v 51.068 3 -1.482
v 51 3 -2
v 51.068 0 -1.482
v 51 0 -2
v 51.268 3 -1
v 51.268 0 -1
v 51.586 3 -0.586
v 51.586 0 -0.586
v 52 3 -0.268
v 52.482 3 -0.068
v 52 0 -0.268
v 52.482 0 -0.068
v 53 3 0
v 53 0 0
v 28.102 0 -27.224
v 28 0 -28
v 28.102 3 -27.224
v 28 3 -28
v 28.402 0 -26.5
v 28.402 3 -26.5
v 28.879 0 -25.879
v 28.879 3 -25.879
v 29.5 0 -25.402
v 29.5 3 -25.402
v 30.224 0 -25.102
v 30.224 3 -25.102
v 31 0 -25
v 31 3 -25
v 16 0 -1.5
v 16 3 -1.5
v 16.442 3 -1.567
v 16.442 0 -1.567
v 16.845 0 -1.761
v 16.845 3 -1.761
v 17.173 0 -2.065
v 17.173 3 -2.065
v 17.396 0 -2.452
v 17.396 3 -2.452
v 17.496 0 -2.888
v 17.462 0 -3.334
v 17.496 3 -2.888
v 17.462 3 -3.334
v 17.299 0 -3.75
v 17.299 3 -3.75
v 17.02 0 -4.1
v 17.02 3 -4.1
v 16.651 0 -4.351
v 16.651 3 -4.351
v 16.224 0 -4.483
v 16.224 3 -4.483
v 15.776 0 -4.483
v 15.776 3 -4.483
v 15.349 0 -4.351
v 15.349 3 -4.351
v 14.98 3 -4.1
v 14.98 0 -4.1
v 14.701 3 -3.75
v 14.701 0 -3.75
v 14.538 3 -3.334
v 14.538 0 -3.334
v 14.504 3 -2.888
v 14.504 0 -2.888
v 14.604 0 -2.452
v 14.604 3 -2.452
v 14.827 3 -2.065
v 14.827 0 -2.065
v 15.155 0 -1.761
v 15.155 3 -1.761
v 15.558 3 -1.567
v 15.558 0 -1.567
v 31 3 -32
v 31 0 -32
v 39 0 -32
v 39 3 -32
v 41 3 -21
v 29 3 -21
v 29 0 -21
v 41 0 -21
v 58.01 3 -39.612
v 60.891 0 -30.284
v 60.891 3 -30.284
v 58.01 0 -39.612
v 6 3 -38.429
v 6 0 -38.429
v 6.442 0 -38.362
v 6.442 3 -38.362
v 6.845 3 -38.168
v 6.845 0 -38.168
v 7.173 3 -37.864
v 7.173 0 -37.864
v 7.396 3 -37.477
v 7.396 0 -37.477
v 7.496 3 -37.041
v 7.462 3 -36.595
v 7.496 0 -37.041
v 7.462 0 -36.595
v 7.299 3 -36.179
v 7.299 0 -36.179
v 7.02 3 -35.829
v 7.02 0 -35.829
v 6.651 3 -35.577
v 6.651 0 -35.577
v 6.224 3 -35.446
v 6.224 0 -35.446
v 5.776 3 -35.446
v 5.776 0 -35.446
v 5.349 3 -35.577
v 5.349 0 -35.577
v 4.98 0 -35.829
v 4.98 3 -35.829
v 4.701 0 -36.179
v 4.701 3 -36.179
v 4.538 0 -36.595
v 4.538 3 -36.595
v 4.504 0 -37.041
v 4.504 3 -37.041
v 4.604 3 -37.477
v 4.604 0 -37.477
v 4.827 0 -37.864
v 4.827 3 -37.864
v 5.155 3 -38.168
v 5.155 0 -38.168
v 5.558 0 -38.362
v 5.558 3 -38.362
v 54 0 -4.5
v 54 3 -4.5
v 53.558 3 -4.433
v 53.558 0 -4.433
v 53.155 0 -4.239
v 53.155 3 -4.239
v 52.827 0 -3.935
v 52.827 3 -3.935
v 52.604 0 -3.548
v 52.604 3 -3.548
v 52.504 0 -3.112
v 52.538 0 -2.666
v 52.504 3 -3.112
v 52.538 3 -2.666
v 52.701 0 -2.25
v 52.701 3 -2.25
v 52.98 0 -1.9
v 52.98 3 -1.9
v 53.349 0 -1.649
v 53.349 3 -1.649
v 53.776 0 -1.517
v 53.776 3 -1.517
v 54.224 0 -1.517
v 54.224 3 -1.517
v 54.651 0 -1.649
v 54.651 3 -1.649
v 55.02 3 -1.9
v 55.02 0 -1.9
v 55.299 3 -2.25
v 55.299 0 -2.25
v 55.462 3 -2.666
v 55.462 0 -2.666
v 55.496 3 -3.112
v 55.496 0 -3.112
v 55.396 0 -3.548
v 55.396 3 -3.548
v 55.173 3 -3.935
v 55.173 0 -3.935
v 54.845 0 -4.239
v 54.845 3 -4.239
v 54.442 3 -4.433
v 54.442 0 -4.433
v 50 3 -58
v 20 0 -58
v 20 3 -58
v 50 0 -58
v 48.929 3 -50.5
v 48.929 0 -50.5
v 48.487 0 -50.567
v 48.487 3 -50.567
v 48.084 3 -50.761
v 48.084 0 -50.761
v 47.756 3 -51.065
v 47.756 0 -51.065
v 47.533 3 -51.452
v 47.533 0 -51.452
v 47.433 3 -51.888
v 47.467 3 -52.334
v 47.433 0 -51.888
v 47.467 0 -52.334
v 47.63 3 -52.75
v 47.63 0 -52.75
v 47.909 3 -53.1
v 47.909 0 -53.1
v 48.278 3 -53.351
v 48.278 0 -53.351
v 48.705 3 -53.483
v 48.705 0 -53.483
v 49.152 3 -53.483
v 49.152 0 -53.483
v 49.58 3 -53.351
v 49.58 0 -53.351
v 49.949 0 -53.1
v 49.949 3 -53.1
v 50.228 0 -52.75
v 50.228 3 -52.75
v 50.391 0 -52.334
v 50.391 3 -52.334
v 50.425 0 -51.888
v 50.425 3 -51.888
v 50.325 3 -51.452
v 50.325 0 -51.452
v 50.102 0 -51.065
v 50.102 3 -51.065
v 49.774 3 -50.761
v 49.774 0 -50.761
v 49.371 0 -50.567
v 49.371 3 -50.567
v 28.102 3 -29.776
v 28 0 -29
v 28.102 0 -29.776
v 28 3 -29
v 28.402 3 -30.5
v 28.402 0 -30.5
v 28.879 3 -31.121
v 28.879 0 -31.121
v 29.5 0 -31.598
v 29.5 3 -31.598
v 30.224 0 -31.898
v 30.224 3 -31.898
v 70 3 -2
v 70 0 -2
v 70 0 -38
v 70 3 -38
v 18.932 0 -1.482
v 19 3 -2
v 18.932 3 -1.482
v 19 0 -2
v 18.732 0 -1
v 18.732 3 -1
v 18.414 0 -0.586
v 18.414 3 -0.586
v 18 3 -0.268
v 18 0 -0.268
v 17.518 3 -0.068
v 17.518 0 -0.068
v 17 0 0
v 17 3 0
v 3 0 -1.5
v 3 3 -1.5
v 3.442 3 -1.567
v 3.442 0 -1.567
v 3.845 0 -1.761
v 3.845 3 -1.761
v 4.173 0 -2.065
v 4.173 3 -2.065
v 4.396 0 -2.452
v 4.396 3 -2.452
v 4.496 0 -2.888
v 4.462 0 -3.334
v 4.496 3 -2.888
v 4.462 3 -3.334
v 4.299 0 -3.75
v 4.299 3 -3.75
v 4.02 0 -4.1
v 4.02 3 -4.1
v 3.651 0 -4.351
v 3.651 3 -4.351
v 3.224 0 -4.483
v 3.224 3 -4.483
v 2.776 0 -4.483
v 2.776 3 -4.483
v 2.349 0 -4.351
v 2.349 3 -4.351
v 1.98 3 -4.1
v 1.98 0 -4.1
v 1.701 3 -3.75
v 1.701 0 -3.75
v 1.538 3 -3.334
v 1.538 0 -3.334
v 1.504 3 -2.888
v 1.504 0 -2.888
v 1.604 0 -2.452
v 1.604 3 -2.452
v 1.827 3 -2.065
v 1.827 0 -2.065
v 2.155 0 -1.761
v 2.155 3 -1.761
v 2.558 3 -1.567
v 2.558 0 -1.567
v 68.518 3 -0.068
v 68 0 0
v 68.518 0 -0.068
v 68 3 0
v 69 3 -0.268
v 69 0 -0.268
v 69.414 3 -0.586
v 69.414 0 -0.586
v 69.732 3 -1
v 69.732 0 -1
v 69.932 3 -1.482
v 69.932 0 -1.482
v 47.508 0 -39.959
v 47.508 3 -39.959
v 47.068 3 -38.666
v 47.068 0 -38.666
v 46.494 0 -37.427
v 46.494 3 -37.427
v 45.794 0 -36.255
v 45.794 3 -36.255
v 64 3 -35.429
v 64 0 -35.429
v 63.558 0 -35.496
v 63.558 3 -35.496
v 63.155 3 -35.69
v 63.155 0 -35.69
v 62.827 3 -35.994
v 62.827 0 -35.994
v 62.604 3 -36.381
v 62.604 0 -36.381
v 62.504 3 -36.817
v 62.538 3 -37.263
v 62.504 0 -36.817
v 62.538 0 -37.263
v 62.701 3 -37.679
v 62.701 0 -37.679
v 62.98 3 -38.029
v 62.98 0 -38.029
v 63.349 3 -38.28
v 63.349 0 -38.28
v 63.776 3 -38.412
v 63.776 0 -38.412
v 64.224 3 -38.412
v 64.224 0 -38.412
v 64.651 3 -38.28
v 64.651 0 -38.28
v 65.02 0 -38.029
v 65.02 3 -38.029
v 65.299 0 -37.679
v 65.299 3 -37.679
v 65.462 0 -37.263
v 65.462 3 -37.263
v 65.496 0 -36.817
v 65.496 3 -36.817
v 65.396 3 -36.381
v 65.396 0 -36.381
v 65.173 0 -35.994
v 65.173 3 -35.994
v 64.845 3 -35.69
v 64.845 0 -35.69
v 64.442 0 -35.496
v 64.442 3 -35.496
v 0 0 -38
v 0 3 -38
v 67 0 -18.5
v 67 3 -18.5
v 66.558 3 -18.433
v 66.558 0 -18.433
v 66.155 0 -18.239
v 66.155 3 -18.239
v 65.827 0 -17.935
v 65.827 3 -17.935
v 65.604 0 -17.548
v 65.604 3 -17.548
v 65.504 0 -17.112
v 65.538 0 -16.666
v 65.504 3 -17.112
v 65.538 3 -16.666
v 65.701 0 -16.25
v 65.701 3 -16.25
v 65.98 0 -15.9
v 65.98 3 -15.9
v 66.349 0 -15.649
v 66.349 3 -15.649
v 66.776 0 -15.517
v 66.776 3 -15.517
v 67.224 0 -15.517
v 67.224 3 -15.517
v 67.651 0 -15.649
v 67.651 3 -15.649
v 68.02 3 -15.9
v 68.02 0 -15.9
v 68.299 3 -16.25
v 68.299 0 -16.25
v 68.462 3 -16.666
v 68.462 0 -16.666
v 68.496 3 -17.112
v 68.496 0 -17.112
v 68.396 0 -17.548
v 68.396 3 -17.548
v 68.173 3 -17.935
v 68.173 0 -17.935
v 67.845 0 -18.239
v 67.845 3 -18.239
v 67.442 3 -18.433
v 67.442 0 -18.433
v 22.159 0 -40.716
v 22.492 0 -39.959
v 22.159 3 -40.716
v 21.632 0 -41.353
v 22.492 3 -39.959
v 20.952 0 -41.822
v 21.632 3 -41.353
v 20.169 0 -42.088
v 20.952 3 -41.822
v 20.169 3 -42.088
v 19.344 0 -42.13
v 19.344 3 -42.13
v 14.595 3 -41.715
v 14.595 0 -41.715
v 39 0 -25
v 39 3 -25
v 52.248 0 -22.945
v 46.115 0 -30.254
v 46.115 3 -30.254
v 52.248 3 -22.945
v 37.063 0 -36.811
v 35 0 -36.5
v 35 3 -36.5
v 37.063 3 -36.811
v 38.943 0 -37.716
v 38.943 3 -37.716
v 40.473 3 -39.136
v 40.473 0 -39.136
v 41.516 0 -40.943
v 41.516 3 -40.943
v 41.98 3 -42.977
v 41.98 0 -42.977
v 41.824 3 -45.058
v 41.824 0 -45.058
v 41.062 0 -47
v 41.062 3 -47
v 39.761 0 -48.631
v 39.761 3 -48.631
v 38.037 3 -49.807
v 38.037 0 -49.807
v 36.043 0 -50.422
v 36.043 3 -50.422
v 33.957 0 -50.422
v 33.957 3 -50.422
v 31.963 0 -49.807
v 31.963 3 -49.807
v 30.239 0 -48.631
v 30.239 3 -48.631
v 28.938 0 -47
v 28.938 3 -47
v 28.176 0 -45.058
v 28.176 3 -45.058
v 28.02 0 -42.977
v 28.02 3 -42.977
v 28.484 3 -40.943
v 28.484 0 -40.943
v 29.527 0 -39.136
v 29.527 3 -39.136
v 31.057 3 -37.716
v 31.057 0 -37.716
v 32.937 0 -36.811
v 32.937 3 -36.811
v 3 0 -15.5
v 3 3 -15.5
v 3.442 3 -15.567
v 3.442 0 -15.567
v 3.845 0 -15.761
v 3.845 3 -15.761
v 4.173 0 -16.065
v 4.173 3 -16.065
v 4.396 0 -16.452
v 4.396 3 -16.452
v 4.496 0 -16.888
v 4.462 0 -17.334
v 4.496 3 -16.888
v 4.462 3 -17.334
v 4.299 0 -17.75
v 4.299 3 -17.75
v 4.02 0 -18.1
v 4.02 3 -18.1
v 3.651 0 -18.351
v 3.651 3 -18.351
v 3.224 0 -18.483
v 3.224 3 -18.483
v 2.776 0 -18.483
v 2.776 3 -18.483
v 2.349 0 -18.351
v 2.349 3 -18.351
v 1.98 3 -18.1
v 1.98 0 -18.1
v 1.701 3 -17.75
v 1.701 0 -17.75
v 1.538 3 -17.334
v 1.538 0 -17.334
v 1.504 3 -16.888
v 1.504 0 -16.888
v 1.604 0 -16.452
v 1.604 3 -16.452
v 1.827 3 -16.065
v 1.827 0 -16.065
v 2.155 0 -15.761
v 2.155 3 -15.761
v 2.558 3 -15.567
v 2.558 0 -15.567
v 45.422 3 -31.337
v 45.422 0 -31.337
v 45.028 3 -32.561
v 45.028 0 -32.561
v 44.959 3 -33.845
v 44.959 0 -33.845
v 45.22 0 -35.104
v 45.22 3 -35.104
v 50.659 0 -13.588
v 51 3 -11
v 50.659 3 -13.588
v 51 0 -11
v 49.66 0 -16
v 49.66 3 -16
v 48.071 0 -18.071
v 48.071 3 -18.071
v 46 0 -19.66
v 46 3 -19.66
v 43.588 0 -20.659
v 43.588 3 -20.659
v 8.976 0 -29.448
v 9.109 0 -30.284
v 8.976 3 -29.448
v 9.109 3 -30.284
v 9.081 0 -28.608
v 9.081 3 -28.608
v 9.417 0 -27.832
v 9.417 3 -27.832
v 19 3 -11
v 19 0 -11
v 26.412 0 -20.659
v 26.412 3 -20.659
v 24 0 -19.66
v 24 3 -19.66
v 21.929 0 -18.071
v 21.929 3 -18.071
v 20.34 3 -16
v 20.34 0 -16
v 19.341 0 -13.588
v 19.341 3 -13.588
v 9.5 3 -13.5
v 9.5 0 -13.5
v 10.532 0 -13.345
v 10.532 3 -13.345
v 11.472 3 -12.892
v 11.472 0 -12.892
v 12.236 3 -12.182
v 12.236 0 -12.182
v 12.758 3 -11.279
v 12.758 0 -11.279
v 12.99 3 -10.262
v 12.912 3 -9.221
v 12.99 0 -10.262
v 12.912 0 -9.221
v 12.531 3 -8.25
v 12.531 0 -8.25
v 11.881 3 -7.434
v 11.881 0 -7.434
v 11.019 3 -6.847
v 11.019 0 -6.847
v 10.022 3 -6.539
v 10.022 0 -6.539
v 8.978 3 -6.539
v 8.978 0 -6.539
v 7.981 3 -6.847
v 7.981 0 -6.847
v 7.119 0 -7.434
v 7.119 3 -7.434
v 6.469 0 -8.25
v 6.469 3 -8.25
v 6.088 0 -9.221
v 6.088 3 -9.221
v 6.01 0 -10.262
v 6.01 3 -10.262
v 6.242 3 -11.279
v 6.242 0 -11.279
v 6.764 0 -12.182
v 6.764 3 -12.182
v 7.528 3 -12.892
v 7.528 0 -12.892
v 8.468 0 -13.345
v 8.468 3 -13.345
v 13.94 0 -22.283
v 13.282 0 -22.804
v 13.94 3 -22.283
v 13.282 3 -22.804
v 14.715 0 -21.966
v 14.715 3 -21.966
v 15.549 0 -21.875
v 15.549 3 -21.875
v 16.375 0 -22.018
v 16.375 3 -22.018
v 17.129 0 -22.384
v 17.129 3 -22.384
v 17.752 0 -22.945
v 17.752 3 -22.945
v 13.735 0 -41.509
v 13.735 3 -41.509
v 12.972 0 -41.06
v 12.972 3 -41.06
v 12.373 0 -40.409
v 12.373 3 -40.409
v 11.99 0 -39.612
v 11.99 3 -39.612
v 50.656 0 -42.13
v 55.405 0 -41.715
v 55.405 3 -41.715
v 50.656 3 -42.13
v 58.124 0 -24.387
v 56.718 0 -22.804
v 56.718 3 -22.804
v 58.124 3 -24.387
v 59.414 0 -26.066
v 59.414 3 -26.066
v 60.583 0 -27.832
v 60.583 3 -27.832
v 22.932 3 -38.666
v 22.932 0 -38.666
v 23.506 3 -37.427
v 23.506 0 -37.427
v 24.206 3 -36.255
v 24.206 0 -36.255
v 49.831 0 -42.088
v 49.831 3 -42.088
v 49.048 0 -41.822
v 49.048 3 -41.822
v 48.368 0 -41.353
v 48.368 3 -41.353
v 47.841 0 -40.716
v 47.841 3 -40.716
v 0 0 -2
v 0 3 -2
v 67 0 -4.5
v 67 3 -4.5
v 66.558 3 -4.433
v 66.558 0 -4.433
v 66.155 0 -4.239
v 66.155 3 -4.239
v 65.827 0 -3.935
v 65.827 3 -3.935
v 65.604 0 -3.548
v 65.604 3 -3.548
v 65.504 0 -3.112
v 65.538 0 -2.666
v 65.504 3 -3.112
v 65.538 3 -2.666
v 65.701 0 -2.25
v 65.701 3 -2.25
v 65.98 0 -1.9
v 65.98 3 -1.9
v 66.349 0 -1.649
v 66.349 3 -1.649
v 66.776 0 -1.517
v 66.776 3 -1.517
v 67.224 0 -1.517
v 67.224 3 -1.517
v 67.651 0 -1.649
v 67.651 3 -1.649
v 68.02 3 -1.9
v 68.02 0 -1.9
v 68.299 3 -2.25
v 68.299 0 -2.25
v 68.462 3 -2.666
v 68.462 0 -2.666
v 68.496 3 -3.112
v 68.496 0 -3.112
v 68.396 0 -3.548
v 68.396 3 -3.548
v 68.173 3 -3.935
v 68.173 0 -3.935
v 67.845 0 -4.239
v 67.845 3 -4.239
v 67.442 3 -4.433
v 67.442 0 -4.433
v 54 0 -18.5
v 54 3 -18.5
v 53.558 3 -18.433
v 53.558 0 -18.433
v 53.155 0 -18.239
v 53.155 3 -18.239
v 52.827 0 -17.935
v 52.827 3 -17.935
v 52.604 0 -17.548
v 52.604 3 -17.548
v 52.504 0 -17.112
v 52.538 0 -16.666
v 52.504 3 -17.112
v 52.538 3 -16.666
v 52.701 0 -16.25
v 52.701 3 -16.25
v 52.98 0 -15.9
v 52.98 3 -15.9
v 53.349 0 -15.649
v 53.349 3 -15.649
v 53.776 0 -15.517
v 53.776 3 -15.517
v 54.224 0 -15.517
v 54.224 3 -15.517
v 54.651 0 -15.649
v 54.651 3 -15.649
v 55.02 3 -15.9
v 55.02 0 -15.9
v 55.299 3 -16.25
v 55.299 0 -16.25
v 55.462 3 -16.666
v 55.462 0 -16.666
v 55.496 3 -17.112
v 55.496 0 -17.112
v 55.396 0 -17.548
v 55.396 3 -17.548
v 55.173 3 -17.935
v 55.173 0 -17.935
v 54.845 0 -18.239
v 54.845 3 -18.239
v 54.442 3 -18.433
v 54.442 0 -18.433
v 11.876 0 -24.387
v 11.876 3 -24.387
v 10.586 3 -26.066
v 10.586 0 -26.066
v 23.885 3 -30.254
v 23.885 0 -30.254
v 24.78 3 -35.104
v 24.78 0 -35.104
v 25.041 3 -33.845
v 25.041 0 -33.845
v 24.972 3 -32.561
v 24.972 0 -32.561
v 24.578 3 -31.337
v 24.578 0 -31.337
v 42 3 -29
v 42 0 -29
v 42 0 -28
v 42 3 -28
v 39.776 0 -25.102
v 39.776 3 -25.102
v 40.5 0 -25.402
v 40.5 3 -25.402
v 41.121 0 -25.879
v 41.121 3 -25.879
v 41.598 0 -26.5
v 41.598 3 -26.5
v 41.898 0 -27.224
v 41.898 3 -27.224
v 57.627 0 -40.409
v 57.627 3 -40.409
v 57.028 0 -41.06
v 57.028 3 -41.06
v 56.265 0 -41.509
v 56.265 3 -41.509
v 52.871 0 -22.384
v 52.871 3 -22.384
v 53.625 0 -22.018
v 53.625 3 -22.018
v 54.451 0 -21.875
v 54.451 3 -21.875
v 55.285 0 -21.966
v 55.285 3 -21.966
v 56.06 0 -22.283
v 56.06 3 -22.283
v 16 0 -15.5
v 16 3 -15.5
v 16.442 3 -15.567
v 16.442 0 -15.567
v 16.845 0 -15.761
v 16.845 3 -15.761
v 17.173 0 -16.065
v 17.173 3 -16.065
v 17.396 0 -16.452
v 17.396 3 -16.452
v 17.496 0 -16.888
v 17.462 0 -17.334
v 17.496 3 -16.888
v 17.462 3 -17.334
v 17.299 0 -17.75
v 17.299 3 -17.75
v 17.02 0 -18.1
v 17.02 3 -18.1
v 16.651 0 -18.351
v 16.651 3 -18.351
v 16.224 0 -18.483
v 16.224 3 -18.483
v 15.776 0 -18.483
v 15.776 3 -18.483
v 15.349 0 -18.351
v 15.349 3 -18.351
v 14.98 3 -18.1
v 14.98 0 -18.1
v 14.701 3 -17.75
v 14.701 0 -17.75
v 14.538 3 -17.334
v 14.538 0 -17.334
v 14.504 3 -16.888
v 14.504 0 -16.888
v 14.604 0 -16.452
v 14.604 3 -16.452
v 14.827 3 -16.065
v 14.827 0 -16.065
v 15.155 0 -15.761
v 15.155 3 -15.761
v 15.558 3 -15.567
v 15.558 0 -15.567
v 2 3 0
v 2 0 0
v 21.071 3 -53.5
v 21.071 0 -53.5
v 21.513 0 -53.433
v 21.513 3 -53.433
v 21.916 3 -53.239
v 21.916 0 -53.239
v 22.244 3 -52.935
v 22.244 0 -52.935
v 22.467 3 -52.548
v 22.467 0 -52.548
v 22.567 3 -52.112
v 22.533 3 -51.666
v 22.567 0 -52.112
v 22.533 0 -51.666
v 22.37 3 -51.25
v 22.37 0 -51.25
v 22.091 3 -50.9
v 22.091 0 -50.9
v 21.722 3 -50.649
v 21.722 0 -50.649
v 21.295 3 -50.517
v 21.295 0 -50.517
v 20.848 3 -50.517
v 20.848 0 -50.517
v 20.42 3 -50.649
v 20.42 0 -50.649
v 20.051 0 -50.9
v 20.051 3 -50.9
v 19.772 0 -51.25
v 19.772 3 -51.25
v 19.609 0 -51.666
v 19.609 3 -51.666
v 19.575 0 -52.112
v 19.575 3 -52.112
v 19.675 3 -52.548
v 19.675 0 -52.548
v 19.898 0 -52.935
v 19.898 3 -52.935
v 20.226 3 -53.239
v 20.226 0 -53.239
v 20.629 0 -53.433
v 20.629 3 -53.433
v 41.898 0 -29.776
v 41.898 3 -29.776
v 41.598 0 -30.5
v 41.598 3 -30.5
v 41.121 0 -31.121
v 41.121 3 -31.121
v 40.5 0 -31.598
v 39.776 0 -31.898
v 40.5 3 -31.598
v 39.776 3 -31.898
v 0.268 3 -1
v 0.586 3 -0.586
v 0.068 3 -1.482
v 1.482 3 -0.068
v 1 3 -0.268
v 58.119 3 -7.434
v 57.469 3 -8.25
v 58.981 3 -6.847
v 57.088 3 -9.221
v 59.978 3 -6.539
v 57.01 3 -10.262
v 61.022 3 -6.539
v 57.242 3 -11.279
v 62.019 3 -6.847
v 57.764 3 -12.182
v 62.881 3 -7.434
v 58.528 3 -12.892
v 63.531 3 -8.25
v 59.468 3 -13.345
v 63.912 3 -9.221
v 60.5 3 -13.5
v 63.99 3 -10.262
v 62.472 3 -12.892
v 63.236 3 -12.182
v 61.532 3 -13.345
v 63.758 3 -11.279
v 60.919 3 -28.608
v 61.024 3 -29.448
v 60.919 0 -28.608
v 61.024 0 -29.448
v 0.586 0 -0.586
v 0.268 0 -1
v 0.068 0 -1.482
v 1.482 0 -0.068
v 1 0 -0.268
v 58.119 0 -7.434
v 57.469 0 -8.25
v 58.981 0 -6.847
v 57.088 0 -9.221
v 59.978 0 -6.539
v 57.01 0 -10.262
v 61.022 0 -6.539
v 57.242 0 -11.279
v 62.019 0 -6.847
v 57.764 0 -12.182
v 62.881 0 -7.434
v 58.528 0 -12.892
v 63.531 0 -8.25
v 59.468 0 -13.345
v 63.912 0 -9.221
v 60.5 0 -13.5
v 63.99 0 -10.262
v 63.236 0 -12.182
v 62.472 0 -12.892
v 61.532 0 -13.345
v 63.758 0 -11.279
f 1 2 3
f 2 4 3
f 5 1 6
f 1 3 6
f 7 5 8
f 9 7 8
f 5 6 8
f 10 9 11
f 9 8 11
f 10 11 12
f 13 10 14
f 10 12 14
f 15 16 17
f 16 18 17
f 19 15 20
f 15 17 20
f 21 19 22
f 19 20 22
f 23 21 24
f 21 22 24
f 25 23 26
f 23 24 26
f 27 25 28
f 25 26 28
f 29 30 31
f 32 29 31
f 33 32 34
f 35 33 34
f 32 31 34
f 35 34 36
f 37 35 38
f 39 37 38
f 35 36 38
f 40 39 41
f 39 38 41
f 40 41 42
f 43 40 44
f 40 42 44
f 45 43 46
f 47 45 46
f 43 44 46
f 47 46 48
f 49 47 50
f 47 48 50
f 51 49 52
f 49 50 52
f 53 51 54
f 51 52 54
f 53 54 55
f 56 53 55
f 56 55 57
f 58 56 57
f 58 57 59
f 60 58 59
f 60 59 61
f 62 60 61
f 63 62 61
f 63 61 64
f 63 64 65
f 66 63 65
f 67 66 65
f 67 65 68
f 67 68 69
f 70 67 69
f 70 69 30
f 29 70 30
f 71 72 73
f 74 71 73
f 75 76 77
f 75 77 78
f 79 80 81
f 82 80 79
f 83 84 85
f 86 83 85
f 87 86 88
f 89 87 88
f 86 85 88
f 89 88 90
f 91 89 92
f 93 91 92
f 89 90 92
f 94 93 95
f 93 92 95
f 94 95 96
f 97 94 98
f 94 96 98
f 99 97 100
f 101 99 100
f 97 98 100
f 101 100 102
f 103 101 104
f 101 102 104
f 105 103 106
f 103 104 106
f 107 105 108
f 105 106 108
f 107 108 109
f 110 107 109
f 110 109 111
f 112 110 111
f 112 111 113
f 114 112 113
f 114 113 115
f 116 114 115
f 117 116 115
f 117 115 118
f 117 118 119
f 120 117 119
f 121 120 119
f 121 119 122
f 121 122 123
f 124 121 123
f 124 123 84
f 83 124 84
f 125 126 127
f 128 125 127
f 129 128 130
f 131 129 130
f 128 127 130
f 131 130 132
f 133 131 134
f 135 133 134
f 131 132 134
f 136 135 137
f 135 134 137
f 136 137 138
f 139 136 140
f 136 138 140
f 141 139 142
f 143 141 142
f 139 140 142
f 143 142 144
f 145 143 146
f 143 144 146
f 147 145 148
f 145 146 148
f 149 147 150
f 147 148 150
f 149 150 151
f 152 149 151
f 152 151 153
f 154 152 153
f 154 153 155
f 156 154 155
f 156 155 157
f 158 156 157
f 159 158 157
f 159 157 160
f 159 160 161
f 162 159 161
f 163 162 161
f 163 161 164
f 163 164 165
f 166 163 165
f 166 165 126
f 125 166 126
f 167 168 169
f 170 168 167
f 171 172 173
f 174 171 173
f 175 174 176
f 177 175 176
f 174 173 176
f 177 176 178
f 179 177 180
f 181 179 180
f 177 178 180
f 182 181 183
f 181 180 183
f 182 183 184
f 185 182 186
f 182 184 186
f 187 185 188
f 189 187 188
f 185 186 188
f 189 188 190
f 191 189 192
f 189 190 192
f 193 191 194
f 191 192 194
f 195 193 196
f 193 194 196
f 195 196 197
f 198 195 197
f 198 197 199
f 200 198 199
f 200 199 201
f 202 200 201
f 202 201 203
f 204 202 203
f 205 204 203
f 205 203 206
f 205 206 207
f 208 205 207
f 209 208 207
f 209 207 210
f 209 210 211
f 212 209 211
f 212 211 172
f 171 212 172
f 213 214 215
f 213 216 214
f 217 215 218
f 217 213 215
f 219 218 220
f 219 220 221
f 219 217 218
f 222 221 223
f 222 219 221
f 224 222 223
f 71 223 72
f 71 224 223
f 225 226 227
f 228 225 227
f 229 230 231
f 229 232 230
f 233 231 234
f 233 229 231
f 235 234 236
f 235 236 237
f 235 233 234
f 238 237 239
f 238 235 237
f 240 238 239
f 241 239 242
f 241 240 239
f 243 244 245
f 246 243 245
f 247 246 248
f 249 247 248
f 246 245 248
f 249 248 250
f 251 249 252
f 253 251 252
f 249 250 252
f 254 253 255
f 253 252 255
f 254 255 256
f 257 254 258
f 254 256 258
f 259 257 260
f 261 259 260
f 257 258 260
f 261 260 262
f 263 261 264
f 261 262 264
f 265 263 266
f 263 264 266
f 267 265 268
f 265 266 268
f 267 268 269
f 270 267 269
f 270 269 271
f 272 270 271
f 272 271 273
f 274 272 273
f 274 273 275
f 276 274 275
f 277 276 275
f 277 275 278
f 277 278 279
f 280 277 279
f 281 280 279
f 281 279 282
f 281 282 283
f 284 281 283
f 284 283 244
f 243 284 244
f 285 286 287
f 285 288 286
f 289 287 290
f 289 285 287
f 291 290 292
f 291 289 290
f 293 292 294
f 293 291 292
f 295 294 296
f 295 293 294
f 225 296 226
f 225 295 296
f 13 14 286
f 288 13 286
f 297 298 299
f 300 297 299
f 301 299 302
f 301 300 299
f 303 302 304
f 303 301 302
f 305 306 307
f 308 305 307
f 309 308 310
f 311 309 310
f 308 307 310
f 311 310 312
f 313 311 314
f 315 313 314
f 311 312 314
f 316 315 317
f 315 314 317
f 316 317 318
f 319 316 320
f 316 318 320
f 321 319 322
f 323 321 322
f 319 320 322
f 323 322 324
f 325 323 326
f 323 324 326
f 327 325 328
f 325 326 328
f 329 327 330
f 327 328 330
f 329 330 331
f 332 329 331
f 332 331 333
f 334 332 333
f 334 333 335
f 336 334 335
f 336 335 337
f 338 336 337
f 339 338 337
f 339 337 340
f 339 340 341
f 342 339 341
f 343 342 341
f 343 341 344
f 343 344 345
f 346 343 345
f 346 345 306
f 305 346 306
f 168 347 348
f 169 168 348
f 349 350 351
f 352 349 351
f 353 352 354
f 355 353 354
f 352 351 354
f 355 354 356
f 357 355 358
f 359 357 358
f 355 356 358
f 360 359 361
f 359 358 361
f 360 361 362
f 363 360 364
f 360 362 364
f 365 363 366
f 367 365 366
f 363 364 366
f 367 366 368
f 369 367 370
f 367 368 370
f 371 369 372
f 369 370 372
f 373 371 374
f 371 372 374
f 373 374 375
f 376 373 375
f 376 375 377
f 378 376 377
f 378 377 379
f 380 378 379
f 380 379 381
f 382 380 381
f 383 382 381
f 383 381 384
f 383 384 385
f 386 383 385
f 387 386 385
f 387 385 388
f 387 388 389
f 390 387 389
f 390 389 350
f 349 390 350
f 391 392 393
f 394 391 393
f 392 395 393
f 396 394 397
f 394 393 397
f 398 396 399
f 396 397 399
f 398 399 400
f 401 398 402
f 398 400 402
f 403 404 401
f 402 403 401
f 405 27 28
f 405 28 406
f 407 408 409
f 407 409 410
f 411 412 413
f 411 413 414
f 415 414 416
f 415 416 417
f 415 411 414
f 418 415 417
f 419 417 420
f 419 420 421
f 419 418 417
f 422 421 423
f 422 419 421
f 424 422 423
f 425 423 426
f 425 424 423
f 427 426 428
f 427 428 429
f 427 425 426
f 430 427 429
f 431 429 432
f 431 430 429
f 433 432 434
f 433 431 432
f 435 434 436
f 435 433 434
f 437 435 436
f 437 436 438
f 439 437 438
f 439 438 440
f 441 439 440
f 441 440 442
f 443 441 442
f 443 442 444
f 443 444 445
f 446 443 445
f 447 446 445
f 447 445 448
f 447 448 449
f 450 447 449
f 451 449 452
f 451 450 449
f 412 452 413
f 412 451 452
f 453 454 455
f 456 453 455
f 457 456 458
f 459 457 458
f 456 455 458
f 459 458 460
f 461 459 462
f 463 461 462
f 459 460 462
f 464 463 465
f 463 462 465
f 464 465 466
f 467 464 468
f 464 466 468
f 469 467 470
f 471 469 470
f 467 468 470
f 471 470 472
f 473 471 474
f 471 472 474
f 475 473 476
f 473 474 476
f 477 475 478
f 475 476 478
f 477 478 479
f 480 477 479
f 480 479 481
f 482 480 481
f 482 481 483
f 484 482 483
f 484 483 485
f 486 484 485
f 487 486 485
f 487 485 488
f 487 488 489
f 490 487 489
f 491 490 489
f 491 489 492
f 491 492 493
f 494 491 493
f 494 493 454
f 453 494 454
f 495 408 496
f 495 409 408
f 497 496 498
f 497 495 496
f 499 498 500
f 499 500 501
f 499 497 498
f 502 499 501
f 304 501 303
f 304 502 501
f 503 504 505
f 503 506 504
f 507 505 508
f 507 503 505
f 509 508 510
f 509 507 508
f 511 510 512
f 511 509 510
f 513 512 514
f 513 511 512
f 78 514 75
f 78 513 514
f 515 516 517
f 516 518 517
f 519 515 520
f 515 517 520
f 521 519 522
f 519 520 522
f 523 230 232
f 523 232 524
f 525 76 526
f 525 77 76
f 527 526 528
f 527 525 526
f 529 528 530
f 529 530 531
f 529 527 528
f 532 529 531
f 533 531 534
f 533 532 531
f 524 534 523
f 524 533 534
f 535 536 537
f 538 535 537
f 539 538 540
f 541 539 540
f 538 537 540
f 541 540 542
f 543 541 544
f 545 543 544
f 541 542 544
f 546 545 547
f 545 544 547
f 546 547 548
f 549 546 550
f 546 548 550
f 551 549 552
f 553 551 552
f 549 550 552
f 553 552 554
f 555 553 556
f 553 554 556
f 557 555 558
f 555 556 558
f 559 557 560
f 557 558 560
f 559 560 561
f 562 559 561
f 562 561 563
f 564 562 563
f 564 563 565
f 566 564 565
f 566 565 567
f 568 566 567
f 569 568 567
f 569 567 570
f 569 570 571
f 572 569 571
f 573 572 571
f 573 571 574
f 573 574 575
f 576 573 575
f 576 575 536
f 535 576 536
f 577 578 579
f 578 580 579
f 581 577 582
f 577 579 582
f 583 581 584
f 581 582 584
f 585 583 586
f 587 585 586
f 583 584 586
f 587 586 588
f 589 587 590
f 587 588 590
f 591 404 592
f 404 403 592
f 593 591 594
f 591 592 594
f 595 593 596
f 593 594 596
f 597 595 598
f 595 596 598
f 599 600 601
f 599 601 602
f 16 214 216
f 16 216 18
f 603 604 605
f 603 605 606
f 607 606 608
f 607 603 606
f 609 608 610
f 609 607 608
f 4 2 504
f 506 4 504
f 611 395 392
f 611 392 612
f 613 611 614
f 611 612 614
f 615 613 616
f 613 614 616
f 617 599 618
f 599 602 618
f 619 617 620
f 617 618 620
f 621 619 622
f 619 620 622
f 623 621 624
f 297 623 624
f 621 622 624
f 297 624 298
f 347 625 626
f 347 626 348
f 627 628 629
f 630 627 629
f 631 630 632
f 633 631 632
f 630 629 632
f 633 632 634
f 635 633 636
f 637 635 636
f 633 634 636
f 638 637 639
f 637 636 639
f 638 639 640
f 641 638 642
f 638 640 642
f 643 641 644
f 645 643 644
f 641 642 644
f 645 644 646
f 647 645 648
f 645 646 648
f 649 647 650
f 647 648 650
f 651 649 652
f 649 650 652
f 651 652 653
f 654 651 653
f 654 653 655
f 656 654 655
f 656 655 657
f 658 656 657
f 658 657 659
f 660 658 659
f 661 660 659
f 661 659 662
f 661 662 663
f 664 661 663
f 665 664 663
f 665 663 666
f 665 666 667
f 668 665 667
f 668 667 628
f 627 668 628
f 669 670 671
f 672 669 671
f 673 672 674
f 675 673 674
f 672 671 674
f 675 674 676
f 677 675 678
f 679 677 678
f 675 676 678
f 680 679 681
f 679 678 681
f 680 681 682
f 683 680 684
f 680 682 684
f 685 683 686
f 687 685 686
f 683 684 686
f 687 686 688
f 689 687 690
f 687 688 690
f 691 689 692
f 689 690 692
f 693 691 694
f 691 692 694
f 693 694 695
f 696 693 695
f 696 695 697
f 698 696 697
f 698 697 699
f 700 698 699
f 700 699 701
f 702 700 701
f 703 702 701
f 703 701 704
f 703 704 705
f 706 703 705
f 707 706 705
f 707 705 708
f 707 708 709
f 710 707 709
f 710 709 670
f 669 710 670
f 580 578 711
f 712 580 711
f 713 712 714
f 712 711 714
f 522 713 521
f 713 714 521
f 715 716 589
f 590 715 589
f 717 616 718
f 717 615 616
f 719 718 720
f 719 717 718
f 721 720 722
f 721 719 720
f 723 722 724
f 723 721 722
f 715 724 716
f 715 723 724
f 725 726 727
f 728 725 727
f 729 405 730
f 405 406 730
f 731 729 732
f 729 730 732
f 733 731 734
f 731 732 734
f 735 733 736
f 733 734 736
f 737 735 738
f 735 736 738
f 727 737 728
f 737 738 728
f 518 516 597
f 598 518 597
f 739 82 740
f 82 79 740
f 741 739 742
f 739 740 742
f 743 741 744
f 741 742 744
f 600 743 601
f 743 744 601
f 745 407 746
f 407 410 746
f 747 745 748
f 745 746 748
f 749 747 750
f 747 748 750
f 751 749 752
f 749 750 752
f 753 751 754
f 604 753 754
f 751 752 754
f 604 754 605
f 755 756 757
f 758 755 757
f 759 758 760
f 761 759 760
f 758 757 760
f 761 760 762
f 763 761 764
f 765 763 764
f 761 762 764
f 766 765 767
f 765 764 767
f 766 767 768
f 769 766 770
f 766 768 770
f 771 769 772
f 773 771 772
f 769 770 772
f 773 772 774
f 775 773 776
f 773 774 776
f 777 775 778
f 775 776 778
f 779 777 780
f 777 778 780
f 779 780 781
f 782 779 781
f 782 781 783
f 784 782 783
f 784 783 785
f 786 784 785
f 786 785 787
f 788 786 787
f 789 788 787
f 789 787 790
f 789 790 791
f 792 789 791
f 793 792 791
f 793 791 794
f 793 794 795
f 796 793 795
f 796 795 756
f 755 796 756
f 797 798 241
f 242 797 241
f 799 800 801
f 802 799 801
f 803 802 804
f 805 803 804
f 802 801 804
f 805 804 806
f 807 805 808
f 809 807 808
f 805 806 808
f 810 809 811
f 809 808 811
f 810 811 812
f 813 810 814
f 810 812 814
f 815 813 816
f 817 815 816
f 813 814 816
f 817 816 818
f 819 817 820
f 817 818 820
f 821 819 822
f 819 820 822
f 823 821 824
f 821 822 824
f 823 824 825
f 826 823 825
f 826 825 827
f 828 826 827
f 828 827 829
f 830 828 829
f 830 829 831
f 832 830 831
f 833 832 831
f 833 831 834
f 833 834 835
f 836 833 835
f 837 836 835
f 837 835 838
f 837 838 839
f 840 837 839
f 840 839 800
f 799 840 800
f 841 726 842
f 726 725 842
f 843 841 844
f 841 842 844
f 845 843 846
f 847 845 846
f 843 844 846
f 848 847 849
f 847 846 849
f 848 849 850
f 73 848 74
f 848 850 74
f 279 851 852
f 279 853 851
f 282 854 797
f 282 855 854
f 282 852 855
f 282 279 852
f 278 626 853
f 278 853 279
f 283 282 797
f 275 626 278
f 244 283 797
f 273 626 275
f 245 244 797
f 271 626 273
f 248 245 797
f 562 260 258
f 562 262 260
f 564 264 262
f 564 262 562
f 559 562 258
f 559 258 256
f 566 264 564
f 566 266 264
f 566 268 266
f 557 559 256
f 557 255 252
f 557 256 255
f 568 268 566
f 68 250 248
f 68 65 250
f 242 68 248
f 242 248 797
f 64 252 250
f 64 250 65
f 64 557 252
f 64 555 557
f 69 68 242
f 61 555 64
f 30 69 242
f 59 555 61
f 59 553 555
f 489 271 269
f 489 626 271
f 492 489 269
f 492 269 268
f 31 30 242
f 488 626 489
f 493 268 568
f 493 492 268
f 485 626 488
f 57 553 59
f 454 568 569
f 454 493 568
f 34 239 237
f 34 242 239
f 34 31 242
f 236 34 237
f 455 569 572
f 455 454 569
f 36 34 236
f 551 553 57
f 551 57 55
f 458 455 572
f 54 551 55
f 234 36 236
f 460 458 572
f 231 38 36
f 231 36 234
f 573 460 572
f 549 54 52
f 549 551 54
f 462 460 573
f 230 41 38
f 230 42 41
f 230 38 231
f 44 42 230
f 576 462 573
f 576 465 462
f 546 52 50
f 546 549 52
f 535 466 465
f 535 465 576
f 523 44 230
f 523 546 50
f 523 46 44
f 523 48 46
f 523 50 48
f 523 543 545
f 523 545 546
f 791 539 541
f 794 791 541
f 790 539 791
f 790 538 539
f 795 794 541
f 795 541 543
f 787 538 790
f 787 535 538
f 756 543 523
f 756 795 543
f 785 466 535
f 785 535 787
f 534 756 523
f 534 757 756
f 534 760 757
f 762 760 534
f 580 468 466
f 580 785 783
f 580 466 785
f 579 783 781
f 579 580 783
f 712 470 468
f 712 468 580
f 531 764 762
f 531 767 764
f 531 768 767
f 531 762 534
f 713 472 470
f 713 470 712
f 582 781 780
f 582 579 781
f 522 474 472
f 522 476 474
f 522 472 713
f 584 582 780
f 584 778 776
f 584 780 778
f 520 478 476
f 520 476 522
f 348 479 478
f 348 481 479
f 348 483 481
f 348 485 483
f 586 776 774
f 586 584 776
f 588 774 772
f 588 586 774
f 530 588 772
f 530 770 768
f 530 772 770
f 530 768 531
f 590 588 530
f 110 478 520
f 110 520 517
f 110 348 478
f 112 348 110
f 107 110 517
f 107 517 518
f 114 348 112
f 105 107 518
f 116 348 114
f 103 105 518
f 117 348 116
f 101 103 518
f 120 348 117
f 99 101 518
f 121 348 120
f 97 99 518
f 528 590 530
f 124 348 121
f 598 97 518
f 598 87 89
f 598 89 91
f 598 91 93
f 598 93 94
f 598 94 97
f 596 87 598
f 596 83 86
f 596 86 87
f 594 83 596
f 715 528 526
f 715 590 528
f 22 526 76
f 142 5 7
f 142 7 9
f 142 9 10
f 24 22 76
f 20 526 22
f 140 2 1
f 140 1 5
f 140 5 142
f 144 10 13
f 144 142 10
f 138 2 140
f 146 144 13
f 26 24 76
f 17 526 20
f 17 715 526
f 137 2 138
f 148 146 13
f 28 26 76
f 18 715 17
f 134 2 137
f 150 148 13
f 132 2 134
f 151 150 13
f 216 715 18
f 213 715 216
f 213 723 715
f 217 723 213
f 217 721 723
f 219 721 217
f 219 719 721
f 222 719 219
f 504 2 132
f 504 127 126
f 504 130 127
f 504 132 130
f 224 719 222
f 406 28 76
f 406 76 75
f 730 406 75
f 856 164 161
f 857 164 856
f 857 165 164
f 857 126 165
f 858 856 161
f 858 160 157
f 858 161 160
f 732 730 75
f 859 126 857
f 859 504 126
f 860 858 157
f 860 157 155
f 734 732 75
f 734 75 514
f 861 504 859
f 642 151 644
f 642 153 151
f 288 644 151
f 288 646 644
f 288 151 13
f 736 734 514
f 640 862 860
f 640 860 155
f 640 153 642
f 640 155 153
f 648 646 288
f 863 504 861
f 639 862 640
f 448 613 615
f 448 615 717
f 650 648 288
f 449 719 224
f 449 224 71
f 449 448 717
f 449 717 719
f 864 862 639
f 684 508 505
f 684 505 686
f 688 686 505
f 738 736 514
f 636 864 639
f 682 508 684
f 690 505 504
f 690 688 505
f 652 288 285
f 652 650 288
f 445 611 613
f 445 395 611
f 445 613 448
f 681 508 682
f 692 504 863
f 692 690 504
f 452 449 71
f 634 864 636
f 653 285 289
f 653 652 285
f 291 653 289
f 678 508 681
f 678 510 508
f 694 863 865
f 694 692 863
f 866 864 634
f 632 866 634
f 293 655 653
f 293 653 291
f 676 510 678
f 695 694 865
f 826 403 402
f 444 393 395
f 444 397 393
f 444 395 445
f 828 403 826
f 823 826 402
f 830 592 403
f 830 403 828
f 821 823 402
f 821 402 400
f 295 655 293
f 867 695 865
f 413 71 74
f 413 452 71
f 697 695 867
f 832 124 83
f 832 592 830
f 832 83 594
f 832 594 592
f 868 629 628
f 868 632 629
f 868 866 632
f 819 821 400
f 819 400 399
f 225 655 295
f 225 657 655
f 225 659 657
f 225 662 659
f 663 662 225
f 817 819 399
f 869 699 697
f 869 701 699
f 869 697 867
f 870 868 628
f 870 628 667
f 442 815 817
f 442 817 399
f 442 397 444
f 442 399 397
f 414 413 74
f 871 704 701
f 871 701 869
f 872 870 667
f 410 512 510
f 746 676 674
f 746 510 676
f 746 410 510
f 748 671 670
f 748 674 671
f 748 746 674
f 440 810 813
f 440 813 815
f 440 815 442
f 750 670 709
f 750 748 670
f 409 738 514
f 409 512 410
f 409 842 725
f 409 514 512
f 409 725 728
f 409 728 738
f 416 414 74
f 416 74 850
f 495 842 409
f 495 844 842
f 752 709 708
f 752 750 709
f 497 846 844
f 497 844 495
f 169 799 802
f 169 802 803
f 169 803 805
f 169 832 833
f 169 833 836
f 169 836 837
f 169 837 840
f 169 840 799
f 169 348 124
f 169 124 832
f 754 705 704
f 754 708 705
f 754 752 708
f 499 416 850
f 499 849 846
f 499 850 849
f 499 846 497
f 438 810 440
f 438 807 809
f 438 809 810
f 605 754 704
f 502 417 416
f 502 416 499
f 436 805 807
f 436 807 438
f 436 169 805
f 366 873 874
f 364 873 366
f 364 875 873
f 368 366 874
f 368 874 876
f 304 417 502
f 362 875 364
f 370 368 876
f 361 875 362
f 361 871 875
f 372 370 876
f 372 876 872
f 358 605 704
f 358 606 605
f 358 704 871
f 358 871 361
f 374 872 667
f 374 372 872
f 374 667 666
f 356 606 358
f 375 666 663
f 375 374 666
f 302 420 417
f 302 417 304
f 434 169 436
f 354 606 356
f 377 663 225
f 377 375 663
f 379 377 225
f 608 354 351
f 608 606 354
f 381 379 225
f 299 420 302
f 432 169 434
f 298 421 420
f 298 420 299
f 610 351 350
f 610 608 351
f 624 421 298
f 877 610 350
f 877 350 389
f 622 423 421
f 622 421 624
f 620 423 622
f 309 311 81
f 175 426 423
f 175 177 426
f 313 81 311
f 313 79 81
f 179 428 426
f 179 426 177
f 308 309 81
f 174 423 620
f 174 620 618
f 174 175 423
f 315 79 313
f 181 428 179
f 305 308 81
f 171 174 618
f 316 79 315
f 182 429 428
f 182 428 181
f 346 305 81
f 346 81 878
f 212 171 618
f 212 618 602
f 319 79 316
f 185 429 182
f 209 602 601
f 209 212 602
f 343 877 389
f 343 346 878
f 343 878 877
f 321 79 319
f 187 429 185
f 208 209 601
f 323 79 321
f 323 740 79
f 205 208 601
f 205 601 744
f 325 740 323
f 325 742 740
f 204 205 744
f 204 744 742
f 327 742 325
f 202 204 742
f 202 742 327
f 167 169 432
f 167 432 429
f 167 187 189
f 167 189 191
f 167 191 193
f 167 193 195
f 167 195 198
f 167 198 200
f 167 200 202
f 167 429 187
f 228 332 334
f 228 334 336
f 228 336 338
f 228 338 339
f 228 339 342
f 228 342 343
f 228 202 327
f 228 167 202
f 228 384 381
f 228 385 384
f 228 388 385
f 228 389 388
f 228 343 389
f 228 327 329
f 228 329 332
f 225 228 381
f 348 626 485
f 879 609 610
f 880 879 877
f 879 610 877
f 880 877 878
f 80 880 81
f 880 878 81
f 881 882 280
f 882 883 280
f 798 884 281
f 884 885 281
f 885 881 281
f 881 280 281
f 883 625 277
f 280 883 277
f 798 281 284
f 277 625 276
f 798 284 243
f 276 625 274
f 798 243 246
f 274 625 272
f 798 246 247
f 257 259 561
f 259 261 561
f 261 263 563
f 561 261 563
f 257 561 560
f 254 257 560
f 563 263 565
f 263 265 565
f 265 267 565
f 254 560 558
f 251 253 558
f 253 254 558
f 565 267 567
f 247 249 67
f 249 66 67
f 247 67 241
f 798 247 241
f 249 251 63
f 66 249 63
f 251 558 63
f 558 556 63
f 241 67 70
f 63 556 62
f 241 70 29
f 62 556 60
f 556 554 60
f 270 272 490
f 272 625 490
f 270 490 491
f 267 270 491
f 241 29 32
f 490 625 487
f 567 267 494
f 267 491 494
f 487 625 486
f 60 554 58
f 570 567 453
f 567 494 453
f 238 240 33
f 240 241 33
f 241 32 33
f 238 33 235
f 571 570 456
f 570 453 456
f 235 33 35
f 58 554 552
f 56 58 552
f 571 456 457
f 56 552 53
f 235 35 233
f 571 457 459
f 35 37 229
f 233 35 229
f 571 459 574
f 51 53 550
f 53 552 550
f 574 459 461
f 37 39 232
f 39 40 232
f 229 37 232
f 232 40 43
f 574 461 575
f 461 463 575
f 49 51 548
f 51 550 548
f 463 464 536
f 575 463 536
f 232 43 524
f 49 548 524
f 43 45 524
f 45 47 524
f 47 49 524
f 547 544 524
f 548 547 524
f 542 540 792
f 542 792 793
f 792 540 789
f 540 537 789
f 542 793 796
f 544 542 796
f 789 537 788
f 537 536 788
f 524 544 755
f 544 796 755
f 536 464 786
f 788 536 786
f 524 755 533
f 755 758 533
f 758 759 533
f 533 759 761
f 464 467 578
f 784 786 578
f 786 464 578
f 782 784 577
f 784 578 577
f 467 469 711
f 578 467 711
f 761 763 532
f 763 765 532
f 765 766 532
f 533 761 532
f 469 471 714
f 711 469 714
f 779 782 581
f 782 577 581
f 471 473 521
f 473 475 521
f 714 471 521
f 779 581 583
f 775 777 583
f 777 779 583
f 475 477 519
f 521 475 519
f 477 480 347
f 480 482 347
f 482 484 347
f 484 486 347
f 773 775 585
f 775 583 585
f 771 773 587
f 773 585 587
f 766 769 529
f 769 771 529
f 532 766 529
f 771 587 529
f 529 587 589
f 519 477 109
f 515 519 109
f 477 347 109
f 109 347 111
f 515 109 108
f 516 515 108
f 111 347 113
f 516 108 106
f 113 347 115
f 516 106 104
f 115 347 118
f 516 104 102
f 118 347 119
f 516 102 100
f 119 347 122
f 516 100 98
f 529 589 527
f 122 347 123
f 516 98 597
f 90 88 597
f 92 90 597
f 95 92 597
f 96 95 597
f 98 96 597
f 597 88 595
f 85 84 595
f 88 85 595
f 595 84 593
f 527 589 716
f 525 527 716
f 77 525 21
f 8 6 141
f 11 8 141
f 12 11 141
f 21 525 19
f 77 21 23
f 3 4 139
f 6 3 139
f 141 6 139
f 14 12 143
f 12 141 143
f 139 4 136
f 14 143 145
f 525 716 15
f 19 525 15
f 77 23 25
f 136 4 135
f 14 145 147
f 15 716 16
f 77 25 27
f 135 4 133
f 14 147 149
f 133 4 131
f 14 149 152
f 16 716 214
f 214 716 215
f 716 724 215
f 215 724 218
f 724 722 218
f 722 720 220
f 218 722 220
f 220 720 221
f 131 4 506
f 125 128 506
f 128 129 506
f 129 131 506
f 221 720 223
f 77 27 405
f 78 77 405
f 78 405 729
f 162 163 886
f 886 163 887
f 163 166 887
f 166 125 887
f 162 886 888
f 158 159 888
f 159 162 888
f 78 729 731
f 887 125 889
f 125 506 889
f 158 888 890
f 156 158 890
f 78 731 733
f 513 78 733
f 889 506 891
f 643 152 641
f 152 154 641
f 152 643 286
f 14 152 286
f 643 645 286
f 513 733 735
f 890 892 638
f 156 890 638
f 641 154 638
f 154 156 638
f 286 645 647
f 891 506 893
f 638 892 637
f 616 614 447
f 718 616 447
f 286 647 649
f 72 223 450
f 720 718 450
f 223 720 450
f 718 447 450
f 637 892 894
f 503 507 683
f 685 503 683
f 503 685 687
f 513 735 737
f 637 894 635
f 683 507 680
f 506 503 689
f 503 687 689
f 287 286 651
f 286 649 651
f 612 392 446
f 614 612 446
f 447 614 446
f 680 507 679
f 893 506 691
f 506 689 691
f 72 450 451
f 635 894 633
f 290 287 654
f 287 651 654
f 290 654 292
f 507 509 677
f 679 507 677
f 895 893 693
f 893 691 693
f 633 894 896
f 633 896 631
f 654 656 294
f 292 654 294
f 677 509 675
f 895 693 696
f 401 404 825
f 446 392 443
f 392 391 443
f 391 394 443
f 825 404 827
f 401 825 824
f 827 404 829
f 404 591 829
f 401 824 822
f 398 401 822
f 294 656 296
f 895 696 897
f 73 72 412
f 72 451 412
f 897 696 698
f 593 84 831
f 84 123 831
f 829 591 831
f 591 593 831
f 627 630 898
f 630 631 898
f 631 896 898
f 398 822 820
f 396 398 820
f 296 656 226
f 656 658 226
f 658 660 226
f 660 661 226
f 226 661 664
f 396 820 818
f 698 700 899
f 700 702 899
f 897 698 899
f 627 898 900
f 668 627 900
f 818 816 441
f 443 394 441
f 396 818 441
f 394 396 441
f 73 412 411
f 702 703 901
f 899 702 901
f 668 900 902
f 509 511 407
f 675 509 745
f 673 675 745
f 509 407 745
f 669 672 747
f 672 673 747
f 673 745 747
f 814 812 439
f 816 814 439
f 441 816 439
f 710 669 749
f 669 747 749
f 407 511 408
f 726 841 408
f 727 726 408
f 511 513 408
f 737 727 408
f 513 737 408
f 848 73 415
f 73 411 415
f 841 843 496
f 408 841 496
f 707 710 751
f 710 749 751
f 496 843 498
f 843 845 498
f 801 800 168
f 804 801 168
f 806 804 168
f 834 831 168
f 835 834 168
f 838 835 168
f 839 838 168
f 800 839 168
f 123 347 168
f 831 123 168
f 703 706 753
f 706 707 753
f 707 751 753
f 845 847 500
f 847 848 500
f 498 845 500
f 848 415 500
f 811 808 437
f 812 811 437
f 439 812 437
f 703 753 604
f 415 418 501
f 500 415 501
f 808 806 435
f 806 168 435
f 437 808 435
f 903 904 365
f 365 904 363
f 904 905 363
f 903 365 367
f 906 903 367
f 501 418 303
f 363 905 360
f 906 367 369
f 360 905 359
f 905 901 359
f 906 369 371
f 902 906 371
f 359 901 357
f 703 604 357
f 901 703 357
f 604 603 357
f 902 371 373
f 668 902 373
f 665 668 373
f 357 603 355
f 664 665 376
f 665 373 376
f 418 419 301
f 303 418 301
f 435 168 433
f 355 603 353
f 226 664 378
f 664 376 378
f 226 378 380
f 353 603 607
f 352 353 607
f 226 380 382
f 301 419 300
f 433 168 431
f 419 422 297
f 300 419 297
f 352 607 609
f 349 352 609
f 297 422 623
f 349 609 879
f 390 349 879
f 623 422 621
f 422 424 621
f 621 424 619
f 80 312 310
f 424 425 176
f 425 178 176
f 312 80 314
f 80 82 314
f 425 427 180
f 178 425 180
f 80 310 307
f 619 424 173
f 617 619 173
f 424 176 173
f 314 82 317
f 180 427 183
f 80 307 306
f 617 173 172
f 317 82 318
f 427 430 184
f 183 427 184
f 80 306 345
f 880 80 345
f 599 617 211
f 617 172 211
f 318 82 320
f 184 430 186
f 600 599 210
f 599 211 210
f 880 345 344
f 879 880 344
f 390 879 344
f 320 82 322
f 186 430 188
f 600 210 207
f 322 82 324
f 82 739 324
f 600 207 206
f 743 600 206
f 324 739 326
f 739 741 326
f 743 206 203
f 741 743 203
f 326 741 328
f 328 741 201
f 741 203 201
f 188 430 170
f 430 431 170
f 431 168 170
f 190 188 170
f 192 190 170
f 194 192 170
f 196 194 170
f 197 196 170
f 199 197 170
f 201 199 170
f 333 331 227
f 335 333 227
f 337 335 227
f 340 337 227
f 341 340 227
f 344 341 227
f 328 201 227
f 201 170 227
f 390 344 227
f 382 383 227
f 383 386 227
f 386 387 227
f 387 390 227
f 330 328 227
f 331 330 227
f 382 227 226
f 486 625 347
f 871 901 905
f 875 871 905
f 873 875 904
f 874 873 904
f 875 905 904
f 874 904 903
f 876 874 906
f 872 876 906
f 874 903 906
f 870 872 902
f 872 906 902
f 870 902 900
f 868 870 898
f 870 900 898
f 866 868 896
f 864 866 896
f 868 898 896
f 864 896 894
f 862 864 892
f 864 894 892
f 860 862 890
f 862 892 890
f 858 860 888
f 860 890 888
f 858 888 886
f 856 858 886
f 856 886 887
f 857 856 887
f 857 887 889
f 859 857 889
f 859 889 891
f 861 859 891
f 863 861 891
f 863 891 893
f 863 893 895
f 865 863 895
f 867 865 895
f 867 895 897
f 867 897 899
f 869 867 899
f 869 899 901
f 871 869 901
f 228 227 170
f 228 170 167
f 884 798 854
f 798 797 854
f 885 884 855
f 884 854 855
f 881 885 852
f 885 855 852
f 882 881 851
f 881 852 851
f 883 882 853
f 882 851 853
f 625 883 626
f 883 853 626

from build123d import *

# Parameters (mm, degrees)
SKETCH_1_W          = 70
SKETCH_1_H          = 58
SKETCH_1_R          = 7
EXTRUDE_1_DEPTH     = 3
CHAMFER_1_SIZE      = 20
SKETCH_2_W          = 32
SKETCH_2_H          = 21
CUT_EXTRUDE_1_DEPTH = 3
FILLET_1_R          = 10
SKETCH_3_R          = 1.5
CUT_EXTRUDE_2_DEPTH = 91.956033335
SKETCH_4_R          = 1.5
CUT_EXTRUDE_3_DEPTH = 91.956033335
FILLET_2_R          = 2
SKETCH_5_W          = 14
SKETCH_5_H          = 7
CUT_EXTRUDE_4_DEPTH = 91.956033335
FILLET_3_R          = 3
FILLET_4_R          = 5
SKETCH_6_R          = 3.5
CUT_EXTRUDE_5_DEPTH = 10


with BuildPart() as part:
    # 草图1 → 凸台-拉伸1 (new body)
    with BuildSketch(Plane(origin=(0, 0, 0), x_dir=(1, 0, 0), z_dir=(0, 1, 0))):
        with Locations((35, 29)):
            Rectangle(SKETCH_1_W, SKETCH_1_H)
        with Locations(Location((35, 43.5, 0), (0, 0, 270))):
            Circle(SKETCH_1_R, mode=Mode.SUBTRACT)
    extrude(amount=EXTRUDE_1_DEPTH)

    # 倒角1
    chamfer_1_edges = [part.edges().sort_by_distance(p)[0] for p in [
        (0, 1.5, -58),
        (70, 1.5, -58),
    ]]
    chamfer(chamfer_1_edges, length=CHAMFER_1_SIZE)

    # 草图2 → 切除-拉伸1 (cut)
    with BuildSketch(Plane(origin=(0, 3, 0), x_dir=(1, 0, 0), z_dir=(0, 1, 0))):
        with Locations((35, 10.5)):
            Rectangle(SKETCH_2_W, SKETCH_2_H)
    extrude(amount=-CUT_EXTRUDE_1_DEPTH, mode=Mode.SUBTRACT)

    # 圆角1
    fillet_1_edges = [part.edges().sort_by_distance(p)[0] for p in [
        (51, 1.5, -21),
        (19, 1.5, -21),
    ]]
    fillet(fillet_1_edges, radius=FILLET_1_R)

    # 草图3 → 切除-拉伸2 (cut, through all)
    with BuildSketch(Plane(origin=(0, 3, 0), x_dir=(1, 0, 0), z_dir=(0, 1, 0))):
        with Locations(Location((3, 17, 0), (0, 0, 270))):
            Circle(SKETCH_3_R)
        with Locations(Location((16, 17, 0), (0, 0, 270))):
            Circle(SKETCH_3_R)
        with Locations(Location((3, 3, 0), (0, 0, 270))):
            Circle(SKETCH_3_R)
        with Locations(Location((16, 3, 0), (0, 0, 270))):
            Circle(SKETCH_3_R)
        with Locations(Location((54, 3, 0), (0, 0, 90))):
            Circle(SKETCH_3_R)
        with Locations(Location((67, 3, 0), (0, 0, 90))):
            Circle(SKETCH_3_R)
        with Locations(Location((54, 17, 0), (0, 0, 90))):
            Circle(SKETCH_3_R)
        with Locations(Location((67, 17, 0), (0, 0, 90))):
            Circle(SKETCH_3_R)
    extrude(amount=-CUT_EXTRUDE_2_DEPTH, mode=Mode.SUBTRACT)

    # 草图4 → 切除-拉伸3 (cut, through all)
    with BuildSketch(Plane.XZ):
        with Locations(Location((21.071067812, -52, 0), (0, 0, 270))):
            Circle(SKETCH_4_R)
        with Locations(Location((6, -36.928932188, 0), (0, 0, 270))):
            Circle(SKETCH_4_R)
        with Locations(Location((64, -36.928932188, 0), (0, 0, 90))):
            Circle(SKETCH_4_R)
        with Locations(Location((48.928932188, -52, 0), (0, 0, 90))):
            Circle(SKETCH_4_R)
    extrude(amount=-CUT_EXTRUDE_3_DEPTH, mode=Mode.SUBTRACT)

    # 圆角2
    fillet_2_edges = [part.edges().sort_by_distance(p)[0] for p in [
        (51, 1.5, 0),
        (19, 1.5, 0),
        (70, 1.5, 0),
        (0, 1.5, 0),
    ]]
    fillet(fillet_2_edges, radius=FILLET_2_R)

    # 草图5 → 切除-拉伸4 (cut, through all)
    with BuildSketch(Plane.XZ):
        with BuildLine():
            Line((43.356238926, -33.541422239), (54.283628291, -20.518666706))
            ThreePointArc((54.283628291, -20.518666706), (58.175259711, -24.449873037), (61.27895346, -29.028766292))
            Line((61.27895346, -29.028766292), (57.414380707, -41.538995788))
            Line((57.414380707, -41.538995788), (47.950531075, -42.366975344))
            ThreePointArc((47.950531075, -42.366975344), (46.531140831, -37.497268028), (43.356238926, -33.541422239))
        make_face()
        with BuildLine():
            Line((26.643761074, -33.541422239), (15.716371709, -20.518666706))
            ThreePointArc((15.716371709, -20.518666706), (11.824740289, -24.449873037), (8.72104654, -29.028766292))
            Line((8.72104654, -29.028766292), (12.585619293, -41.538995788))
            Line((12.585619293, -41.538995788), (22.049468925, -42.366975344))
            ThreePointArc((22.049468925, -42.366975344), (23.468859169, -37.497268028), (26.643761074, -33.541422239))
        make_face()
        with Locations((35, -28.5)):
            Rectangle(SKETCH_5_W, SKETCH_5_H)
    extrude(amount=-CUT_EXTRUDE_4_DEPTH, mode=Mode.SUBTRACT)

    # 圆角3
    fillet_3_edges = [part.edges().sort_by_distance(p)[0] for p in [
        (22.049468925, 1.5, -42.366975344),
        (12.585619293, 1.5, -41.538995788),
        (8.72104654, 1.5, -29.028766292),
        (15.716371709, 1.5, -20.518666706),
        (54.283628291, 1.5, -20.518666706),
        (61.27895346, 1.5, -29.028766292),
        (57.414380707, 1.5, -41.538995788),
        (47.950531075, 1.5, -42.366975344),
        (42, 1.5, -25),
        (42, 1.5, -32),
        (28, 1.5, -32),
        (28, 1.5, -25),
    ]]
    fillet(fillet_3_edges, radius=FILLET_3_R)

    # 圆角4
    fillet_4_edges = [part.edges().sort_by_distance(p)[0] for p in [
        (26.643761074, 1.5, -33.541422239),
        (43.356238926, 1.5, -33.541422239),
    ]]
    fillet(fillet_4_edges, radius=FILLET_4_R)

    # 草图6 → 切除-拉伸5 (cut)
    with BuildSketch(Plane.XZ):
        with Locations(Location((9.5, -10, 0), (0, 0, 270))):
            Circle(SKETCH_6_R)
        with Locations(Location((60.5, -10, 0), (0, 0, 270))):
            Circle(SKETCH_6_R)
    extrude(amount=-CUT_EXTRUDE_5_DEPTH, mode=Mode.SUBTRACT)


solid = part.part
